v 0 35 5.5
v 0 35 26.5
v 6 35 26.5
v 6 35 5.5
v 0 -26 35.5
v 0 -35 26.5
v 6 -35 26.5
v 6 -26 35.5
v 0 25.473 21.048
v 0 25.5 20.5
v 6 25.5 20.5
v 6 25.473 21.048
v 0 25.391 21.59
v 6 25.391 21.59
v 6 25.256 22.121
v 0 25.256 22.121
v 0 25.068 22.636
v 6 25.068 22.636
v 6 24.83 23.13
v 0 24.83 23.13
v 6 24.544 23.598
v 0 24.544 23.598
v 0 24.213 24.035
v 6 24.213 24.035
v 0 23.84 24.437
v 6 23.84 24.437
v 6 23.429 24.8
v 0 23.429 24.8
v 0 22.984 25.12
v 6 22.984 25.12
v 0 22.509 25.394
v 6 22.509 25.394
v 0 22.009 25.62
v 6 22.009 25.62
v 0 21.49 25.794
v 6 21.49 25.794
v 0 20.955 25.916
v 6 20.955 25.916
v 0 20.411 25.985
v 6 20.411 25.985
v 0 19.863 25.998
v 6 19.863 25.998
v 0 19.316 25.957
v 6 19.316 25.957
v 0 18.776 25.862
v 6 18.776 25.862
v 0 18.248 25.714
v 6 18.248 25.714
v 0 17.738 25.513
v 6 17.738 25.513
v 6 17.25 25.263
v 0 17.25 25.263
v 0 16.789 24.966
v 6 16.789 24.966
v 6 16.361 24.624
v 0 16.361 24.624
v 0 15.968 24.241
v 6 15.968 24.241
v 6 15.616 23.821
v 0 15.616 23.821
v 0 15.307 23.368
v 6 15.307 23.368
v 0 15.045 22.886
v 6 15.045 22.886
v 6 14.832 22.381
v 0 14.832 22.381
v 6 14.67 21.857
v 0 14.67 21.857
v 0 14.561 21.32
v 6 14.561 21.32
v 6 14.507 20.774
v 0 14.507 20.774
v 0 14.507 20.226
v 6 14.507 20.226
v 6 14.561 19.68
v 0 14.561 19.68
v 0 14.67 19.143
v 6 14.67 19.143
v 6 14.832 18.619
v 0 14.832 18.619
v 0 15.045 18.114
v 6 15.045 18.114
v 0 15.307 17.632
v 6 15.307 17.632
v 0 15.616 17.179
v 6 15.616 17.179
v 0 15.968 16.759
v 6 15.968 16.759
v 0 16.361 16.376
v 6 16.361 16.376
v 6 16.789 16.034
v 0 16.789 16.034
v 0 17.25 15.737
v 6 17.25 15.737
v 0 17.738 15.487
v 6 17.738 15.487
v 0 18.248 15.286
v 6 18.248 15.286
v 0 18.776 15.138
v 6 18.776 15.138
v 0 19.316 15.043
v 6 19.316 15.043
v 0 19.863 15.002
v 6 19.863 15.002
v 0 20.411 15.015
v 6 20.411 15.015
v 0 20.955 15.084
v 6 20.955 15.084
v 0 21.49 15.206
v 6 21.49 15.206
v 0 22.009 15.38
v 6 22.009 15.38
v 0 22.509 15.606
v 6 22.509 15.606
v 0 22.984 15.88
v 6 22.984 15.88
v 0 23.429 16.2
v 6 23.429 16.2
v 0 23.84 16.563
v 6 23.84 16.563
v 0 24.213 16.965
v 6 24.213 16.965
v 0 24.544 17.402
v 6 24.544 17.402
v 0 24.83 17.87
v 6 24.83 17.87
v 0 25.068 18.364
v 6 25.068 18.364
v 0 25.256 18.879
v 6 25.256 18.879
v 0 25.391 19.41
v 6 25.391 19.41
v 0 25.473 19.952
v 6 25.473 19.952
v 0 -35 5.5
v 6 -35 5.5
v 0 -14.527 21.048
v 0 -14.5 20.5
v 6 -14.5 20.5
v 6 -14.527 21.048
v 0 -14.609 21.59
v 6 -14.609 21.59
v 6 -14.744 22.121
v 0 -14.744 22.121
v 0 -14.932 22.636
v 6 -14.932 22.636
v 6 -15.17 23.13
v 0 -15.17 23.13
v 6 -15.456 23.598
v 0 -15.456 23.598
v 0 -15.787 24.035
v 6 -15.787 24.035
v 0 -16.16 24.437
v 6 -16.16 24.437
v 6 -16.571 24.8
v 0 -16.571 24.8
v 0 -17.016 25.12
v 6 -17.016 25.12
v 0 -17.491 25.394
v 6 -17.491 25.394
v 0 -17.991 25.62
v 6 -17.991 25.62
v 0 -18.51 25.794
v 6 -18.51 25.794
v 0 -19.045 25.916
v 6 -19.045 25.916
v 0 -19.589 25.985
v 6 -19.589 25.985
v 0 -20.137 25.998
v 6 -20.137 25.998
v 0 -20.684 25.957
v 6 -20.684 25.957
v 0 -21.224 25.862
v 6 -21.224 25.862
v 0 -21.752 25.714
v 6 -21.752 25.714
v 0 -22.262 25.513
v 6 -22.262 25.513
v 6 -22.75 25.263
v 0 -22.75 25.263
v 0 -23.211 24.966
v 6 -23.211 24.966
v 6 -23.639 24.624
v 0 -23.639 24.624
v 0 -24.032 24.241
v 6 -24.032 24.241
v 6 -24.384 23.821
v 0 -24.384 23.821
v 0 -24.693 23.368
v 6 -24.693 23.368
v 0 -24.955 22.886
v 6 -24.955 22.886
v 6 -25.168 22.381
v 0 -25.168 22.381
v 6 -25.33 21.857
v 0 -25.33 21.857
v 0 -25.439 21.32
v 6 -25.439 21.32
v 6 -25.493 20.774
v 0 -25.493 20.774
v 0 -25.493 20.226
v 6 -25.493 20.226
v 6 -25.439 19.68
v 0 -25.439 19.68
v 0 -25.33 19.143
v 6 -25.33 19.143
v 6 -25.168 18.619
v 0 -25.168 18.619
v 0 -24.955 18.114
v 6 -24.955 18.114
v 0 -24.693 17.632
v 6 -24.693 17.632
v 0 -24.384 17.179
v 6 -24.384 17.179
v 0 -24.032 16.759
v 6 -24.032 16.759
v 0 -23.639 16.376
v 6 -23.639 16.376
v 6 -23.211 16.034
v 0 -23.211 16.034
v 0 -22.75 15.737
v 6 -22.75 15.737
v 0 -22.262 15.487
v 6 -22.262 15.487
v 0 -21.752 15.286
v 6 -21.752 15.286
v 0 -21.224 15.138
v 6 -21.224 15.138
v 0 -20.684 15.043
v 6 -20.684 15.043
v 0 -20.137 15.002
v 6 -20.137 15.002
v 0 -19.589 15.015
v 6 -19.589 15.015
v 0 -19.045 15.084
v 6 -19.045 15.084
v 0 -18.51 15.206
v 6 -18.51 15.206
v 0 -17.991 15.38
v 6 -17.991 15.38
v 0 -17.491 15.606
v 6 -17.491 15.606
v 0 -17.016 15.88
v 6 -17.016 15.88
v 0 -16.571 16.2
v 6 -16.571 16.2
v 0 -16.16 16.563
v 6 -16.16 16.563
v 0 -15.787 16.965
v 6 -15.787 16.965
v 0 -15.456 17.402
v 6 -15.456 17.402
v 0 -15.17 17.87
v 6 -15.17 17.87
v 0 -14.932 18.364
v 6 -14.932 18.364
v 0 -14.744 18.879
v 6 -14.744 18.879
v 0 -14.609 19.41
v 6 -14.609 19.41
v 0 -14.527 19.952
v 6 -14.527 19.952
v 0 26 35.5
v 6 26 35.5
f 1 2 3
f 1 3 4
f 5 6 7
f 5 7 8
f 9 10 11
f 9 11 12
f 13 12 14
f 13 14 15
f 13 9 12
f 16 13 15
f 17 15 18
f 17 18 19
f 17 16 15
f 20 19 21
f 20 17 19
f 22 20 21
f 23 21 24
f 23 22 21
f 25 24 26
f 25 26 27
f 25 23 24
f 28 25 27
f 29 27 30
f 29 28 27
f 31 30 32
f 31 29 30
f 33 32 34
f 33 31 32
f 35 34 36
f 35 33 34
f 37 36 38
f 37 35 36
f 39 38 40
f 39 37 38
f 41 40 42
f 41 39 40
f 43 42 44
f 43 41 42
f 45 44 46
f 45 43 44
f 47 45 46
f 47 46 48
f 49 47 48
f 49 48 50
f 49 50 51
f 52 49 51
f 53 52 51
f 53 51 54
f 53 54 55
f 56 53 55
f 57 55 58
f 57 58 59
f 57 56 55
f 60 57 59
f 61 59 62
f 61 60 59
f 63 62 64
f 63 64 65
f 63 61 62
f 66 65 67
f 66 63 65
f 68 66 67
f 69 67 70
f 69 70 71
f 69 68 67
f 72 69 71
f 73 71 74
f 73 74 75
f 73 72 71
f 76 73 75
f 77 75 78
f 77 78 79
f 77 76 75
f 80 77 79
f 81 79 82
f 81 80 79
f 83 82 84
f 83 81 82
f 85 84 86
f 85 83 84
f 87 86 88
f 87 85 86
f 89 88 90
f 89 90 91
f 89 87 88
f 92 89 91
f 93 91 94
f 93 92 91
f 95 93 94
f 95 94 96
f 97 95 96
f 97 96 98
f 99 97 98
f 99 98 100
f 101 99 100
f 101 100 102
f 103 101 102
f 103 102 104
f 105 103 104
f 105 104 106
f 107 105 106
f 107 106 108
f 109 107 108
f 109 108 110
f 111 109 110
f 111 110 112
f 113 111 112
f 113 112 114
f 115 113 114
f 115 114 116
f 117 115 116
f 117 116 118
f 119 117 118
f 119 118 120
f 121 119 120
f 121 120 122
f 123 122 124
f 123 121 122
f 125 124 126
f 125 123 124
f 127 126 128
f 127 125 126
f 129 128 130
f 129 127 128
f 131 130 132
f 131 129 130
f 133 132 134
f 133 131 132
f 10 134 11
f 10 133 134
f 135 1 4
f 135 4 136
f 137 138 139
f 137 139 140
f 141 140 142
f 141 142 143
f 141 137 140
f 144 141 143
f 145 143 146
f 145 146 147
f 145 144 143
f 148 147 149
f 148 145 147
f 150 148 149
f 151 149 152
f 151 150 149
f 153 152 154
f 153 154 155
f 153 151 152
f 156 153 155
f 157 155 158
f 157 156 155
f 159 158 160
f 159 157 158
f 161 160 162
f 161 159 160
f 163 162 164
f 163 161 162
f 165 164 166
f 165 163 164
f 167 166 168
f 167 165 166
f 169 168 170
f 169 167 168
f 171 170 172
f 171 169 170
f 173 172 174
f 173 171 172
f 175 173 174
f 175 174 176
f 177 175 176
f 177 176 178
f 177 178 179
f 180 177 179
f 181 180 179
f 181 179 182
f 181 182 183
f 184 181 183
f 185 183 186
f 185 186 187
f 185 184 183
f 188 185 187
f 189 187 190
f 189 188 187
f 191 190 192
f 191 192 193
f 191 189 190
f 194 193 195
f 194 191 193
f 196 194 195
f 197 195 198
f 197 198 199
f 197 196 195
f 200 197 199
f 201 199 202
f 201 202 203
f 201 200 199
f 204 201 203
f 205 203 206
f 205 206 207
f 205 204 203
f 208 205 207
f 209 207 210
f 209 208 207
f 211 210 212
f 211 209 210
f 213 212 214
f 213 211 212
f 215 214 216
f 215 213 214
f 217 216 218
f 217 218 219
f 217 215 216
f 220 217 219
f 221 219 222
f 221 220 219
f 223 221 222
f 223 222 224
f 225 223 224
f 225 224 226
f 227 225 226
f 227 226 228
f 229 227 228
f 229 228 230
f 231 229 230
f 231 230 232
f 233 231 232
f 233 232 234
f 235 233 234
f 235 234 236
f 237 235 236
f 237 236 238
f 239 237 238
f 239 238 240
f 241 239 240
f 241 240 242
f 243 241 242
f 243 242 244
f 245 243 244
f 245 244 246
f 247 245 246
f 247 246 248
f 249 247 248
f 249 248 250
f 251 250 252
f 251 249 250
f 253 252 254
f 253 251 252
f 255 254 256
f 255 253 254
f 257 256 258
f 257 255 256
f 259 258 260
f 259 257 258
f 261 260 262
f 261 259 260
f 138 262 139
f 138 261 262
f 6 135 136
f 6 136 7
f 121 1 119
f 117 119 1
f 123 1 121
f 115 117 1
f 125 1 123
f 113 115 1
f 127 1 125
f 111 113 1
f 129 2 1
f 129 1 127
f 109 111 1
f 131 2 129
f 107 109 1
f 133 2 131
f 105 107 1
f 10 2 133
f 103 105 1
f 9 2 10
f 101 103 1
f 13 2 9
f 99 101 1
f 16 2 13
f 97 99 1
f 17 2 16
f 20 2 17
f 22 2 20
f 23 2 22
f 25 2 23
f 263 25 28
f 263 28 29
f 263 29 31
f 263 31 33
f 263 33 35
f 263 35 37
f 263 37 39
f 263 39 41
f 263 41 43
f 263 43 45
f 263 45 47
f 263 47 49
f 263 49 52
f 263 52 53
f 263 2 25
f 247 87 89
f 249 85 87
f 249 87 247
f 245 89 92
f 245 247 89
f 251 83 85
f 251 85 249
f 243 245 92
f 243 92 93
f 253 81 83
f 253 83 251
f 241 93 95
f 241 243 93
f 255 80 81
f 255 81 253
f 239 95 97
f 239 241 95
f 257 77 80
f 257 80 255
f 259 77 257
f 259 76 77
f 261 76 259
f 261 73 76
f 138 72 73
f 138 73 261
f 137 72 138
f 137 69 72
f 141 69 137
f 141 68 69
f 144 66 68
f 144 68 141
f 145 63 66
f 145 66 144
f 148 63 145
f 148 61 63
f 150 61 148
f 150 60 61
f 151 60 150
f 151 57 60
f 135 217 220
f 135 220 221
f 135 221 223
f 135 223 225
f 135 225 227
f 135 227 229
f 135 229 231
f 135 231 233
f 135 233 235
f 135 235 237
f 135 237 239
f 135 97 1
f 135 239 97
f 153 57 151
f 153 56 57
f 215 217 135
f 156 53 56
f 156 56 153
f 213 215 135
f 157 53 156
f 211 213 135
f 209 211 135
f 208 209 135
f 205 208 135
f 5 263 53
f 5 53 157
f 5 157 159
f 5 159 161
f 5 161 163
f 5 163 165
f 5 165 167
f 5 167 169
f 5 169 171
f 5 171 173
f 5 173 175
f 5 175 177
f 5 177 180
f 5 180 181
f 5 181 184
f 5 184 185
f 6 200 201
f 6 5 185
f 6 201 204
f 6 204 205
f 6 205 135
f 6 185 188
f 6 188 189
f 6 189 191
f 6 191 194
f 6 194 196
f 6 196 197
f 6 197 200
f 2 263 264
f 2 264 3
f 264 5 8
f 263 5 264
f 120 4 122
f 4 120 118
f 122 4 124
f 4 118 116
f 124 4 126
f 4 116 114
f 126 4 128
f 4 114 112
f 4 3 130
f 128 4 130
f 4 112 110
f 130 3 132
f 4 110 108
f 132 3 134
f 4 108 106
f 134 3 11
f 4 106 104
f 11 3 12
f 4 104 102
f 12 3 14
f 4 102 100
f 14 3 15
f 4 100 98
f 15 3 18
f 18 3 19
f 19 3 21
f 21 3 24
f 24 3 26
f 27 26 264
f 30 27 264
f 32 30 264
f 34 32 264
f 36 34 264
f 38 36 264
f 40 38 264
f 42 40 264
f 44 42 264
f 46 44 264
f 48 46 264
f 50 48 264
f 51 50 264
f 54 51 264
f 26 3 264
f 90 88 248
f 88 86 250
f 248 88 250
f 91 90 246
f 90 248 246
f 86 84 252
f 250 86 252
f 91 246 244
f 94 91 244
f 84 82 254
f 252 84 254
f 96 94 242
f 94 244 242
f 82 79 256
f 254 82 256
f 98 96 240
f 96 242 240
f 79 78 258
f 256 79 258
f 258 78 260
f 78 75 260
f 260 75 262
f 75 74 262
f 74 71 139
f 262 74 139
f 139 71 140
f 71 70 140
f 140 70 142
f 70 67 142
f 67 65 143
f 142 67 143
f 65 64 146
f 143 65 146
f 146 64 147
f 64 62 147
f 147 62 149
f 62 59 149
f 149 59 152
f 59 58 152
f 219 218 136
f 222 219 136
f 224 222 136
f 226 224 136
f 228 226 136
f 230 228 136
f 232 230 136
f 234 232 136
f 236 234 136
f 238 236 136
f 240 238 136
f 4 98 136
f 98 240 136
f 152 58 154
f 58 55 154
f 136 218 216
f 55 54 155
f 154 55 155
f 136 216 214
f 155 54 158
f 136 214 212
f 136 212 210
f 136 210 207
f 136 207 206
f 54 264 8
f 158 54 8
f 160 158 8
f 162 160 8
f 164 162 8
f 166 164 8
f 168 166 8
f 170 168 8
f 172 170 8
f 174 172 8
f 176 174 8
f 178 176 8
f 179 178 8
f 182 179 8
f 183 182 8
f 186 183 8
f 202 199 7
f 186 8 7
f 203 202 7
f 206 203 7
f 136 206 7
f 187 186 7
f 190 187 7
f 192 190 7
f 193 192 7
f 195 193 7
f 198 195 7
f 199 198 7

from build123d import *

# Parameters (mm, degrees)
SKETCH_R  = 5.5
PAD_DEPTH = 6


with BuildPart() as part:
    # Sketch → Pad (new body)
    with BuildSketch(Plane.YZ):
        Polygon((-26, 35.5), (26, 35.5), (35, 26.5), (35, 5.5), (-35, 5.5), (-35, 26.5), align=None)
        with Locations((-20, 20.5)):
            Circle(SKETCH_R, mode=Mode.SUBTRACT)
        with Locations((20, 20.5)):
            Circle(SKETCH_R, mode=Mode.SUBTRACT)
    extrude(amount=PAD_DEPTH)


solid = part.part
